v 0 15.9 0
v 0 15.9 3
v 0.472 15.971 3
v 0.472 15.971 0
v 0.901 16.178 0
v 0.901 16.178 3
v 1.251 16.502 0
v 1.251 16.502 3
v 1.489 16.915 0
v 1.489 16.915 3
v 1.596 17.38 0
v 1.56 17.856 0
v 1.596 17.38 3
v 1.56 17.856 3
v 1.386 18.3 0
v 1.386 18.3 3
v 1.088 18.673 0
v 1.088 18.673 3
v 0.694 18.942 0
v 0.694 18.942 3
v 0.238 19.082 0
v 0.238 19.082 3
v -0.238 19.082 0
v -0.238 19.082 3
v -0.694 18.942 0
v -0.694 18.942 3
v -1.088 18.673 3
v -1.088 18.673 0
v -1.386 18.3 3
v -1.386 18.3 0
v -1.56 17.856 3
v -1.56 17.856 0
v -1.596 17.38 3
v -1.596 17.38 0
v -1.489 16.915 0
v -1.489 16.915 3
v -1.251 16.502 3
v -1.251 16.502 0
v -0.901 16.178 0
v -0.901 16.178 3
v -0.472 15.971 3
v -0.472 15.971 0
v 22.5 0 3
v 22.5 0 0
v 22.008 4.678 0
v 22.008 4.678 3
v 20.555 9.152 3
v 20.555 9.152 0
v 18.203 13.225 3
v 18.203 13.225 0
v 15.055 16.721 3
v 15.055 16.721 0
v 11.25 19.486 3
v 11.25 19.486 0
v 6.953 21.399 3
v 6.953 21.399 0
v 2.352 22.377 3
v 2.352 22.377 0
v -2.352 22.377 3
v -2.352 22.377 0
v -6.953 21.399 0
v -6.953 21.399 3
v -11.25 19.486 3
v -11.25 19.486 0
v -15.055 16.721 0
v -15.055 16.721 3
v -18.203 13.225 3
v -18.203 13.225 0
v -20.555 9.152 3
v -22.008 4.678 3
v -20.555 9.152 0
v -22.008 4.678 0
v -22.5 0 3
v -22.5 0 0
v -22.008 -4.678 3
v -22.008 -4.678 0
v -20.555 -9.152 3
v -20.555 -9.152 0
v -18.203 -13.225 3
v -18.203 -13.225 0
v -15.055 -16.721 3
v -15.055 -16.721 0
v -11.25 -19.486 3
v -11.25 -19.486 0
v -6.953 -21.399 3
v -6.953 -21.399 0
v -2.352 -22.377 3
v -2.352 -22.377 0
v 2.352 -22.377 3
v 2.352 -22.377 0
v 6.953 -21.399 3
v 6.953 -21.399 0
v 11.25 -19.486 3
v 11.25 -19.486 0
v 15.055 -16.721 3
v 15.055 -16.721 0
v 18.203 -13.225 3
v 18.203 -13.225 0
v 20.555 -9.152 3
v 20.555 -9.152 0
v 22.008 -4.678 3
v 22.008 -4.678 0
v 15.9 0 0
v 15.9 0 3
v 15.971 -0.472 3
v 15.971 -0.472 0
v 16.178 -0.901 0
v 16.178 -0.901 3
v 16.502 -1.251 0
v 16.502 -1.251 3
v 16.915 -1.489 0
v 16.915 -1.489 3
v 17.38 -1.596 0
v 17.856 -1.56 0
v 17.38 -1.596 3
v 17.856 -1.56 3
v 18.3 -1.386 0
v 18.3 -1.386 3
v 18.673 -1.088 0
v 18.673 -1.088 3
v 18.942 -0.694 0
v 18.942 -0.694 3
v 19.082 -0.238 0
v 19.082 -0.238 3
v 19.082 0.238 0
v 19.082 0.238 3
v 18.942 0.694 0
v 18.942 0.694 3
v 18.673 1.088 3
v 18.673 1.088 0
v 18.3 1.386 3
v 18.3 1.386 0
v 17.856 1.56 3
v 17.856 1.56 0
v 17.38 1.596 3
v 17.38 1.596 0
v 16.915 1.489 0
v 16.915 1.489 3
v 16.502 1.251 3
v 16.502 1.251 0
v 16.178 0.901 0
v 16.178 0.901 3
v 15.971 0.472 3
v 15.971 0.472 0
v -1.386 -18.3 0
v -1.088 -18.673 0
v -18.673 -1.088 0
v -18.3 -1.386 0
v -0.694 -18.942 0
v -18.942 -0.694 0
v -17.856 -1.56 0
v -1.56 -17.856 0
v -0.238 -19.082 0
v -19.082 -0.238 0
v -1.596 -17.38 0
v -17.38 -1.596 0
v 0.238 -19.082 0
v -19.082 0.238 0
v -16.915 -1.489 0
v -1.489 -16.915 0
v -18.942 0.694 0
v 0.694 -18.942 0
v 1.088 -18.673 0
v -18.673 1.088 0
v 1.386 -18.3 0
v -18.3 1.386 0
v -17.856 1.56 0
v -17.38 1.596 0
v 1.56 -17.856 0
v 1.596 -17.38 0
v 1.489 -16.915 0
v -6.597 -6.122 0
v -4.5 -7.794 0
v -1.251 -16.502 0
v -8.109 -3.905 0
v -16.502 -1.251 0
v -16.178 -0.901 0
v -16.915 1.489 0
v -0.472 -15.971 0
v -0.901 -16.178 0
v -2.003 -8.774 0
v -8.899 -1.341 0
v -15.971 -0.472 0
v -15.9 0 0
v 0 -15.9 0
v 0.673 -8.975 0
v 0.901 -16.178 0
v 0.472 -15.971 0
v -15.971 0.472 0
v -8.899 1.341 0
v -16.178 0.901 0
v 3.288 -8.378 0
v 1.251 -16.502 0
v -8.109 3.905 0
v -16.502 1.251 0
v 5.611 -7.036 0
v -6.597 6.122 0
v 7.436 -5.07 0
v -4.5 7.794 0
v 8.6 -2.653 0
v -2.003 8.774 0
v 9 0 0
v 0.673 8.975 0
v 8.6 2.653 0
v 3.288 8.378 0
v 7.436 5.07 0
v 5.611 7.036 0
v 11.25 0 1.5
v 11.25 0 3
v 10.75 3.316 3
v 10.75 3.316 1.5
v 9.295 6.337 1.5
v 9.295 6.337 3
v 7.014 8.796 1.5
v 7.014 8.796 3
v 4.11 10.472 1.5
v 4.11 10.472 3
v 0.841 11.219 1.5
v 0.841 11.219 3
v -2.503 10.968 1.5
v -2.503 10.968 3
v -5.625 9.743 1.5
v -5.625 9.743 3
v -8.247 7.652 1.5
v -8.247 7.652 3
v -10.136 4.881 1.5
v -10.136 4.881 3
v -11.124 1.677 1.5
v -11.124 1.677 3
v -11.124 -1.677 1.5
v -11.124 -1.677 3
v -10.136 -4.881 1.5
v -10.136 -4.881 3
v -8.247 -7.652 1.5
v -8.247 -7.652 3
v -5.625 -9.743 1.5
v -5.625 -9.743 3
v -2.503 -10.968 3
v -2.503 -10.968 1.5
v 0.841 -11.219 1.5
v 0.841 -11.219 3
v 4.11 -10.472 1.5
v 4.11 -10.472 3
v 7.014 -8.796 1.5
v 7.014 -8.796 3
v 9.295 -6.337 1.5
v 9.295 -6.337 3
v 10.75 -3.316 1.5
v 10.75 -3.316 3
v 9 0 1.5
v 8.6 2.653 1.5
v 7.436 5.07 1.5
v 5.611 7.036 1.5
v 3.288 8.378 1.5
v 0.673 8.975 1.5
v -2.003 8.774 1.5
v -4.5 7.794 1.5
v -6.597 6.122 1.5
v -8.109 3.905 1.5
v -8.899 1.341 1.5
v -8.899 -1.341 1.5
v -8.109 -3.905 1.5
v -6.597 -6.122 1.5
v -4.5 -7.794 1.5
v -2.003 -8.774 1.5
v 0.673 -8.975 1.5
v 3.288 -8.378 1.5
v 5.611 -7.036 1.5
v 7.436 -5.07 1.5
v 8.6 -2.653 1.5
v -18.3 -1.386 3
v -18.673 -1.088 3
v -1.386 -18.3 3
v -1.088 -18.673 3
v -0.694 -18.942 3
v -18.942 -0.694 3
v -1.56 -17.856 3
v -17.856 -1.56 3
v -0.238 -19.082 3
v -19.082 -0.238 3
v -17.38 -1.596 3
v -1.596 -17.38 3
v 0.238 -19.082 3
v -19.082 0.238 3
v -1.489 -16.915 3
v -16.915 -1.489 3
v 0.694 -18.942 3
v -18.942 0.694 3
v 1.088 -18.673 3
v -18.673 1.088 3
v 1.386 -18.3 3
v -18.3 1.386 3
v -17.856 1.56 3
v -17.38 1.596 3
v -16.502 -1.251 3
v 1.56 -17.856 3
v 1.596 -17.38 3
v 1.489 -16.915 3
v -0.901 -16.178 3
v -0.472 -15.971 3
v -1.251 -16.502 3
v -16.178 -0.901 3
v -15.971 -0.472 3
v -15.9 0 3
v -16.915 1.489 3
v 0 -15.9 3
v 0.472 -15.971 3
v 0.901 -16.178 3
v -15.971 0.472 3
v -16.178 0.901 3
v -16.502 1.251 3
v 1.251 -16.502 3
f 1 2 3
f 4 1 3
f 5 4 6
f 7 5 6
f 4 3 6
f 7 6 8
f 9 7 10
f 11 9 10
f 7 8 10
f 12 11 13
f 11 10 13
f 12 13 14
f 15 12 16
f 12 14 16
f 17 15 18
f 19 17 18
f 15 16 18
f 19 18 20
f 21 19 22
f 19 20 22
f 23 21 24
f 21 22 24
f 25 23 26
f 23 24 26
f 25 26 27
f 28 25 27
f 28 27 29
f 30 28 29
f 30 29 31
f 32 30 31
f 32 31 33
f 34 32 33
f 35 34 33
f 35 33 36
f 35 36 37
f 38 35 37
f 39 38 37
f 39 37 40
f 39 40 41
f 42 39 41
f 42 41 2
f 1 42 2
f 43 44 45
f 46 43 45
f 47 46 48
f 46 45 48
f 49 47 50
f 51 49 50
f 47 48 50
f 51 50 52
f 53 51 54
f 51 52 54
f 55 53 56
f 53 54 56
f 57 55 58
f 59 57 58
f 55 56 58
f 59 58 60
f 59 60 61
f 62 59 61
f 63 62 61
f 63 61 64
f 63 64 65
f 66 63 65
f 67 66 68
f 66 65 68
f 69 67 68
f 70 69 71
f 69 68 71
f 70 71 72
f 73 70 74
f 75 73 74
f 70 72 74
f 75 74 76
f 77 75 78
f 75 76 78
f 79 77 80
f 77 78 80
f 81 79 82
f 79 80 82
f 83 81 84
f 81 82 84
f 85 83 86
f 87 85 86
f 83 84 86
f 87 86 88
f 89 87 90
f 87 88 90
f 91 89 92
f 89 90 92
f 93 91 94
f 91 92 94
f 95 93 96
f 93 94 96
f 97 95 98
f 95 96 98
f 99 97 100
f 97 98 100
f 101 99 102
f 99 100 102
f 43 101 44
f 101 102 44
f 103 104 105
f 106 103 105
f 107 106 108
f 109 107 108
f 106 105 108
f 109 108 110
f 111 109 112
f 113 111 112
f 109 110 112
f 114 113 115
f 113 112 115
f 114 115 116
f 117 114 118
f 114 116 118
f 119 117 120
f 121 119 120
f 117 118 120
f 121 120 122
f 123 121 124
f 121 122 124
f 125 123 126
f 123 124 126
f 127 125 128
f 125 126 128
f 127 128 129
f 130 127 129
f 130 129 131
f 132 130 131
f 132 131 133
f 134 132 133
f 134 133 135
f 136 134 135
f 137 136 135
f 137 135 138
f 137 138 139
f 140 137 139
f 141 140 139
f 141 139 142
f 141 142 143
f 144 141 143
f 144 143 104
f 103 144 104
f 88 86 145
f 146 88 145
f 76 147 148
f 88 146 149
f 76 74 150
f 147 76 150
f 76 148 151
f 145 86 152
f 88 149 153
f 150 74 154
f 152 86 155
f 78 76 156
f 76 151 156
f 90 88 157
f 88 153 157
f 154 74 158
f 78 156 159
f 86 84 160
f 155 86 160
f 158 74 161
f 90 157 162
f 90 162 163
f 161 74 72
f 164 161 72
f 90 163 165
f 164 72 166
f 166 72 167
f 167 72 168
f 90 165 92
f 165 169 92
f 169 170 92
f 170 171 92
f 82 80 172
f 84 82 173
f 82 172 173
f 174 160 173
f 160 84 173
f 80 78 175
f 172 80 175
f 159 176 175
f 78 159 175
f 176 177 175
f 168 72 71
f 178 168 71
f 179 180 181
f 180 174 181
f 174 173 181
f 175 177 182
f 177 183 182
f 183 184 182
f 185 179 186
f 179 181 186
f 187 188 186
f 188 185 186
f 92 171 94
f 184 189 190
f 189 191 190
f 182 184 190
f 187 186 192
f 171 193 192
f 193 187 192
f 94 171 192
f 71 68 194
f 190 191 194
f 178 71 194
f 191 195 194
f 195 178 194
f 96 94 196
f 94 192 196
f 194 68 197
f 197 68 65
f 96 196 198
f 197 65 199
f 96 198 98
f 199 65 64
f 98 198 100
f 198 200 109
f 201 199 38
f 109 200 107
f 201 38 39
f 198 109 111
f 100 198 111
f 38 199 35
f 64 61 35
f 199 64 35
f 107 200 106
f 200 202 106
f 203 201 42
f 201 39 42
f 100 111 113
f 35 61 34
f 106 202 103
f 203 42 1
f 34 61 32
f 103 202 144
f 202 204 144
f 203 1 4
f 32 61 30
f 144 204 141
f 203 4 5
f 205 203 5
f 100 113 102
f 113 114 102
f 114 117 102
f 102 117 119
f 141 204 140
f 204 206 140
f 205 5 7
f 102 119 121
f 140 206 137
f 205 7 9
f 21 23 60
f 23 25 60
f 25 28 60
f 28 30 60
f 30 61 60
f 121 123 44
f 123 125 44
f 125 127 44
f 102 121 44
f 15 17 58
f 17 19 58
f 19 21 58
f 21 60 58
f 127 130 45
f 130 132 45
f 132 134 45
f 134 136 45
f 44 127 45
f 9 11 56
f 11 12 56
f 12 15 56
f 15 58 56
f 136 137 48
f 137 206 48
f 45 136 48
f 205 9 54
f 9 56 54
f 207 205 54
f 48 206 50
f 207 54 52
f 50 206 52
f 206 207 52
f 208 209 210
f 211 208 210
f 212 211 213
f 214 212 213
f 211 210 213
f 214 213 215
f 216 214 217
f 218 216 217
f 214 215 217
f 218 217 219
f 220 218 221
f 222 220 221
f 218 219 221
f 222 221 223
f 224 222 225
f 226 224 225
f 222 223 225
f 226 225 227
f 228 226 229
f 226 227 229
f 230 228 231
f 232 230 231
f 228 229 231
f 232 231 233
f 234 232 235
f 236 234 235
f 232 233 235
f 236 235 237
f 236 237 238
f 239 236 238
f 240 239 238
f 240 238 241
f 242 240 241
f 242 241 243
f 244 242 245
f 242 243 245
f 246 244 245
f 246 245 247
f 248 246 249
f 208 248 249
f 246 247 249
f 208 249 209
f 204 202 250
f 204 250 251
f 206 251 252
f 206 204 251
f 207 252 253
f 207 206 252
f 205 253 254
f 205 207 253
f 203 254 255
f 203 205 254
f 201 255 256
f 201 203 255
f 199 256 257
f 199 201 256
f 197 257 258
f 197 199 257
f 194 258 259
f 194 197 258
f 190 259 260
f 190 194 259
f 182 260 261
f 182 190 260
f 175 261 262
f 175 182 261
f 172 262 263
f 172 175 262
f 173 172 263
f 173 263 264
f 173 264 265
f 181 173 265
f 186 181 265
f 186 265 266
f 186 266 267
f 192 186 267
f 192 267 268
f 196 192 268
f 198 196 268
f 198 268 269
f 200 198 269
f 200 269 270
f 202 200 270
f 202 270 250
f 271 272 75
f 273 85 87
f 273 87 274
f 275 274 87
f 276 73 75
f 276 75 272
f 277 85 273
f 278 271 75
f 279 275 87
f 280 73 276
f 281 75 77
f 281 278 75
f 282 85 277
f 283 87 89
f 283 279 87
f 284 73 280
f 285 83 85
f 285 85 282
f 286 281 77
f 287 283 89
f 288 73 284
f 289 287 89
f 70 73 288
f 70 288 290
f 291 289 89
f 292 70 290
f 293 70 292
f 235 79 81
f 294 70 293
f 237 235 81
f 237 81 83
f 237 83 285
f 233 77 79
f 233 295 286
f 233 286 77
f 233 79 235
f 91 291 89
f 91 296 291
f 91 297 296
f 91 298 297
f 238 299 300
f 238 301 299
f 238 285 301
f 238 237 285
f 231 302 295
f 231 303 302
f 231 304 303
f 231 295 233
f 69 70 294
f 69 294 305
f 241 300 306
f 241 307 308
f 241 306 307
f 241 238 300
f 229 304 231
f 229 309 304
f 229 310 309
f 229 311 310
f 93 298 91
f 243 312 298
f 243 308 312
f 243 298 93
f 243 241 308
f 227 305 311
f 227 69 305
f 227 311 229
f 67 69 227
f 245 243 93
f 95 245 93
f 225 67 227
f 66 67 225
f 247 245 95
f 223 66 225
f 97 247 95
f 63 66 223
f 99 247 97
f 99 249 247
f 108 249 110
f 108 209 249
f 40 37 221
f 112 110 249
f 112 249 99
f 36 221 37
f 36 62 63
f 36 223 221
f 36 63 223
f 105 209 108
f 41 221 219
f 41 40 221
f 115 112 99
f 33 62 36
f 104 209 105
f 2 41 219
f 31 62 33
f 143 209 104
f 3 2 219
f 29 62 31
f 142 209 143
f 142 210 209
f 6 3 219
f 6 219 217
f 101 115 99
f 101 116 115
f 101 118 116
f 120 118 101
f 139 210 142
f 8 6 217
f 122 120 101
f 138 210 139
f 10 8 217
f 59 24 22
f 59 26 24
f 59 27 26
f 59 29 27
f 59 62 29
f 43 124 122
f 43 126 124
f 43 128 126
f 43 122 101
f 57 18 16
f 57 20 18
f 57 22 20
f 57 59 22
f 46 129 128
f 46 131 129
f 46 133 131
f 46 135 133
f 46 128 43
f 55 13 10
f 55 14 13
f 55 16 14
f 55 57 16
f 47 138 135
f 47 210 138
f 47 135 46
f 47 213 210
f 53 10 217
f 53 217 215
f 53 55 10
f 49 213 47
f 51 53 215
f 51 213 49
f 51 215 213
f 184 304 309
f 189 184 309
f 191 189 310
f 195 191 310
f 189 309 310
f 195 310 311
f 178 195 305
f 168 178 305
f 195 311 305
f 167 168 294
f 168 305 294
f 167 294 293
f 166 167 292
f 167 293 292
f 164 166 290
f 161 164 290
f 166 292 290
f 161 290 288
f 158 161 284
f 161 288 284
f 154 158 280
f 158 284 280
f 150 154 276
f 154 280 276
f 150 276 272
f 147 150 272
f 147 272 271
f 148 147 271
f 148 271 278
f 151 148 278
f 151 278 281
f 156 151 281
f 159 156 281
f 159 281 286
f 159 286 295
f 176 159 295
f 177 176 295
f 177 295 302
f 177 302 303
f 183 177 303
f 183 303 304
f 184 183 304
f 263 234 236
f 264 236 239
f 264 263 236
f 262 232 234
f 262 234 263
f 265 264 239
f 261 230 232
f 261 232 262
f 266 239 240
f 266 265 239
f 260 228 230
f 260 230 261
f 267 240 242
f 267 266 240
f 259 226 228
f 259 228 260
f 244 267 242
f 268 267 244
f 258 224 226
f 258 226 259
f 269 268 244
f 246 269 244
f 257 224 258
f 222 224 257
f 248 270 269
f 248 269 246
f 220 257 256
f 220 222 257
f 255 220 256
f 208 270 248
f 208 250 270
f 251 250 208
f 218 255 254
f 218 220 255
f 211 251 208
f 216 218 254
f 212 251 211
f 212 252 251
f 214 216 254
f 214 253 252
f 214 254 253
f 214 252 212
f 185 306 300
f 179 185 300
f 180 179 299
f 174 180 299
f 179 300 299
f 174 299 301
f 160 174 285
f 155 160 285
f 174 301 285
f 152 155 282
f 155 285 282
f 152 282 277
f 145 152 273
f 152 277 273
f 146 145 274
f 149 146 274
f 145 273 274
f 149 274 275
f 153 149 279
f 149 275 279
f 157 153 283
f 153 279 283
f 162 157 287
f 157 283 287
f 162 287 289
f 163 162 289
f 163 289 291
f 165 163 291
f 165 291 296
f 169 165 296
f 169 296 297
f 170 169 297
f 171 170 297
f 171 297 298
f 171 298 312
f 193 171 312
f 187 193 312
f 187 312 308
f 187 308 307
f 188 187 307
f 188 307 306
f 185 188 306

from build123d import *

# Parameters (mm, degrees)
SKETCH_1_R               = 22.5
SKETCH_1_R_2             = 9
EXTRUDE_1_DEPTH          = 3
SKETCH_2_R               = 1.6
CUT_EXTRUDE_1_DEPTH      = 4
PATTERN_CIRCULAR_2_COUNT = 4
SKETCH_3_R               = 11.25
SKETCH_3_R_2             = 9
CUT_EXTRUDE_2_DEPTH      = 1.5


with BuildPart() as part:
    # ｽｹｯﾁ1 → ﾎﾞｽ - 押し出し1 (new body)
    with BuildSketch(Plane.XY):
        Circle(SKETCH_1_R)
        Circle(SKETCH_1_R_2, mode=Mode.SUBTRACT)
    extrude(amount=EXTRUDE_1_DEPTH)

    # ｽｹｯﾁ2 → ｶｯﾄ - 押し出し1 (cut, through all)
    with BuildSketch(Plane.XY.offset(3)):
        with Locations((-17.5, 0)):
            Circle(SKETCH_2_R)
    cut_extrude_1 = extrude(amount=-CUT_EXTRUDE_1_DEPTH, mode=Mode.SUBTRACT)

    # 円形ﾊﾟﾀｰﾝ2: ｶｯﾄ - 押し出し1 ×4 about axis
    pattern_circular_2_axis = Axis((0, 0, 0), (0, 0, 1))
    for i in range(1, PATTERN_CIRCULAR_2_COUNT):
        add(cut_extrude_1.rotate(pattern_circular_2_axis, i * 360 / PATTERN_CIRCULAR_2_COUNT), mode=Mode.SUBTRACT)

    # ｽｹｯﾁ3 → ｶｯﾄ - 押し出し2 (cut)
    with BuildSketch(Plane.XY.offset(3)):
        Circle(SKETCH_3_R)
        Circle(SKETCH_3_R_2, mode=Mode.SUBTRACT)
    extrude(amount=-CUT_EXTRUDE_2_DEPTH, mode=Mode.SUBTRACT)


solid = part.part
